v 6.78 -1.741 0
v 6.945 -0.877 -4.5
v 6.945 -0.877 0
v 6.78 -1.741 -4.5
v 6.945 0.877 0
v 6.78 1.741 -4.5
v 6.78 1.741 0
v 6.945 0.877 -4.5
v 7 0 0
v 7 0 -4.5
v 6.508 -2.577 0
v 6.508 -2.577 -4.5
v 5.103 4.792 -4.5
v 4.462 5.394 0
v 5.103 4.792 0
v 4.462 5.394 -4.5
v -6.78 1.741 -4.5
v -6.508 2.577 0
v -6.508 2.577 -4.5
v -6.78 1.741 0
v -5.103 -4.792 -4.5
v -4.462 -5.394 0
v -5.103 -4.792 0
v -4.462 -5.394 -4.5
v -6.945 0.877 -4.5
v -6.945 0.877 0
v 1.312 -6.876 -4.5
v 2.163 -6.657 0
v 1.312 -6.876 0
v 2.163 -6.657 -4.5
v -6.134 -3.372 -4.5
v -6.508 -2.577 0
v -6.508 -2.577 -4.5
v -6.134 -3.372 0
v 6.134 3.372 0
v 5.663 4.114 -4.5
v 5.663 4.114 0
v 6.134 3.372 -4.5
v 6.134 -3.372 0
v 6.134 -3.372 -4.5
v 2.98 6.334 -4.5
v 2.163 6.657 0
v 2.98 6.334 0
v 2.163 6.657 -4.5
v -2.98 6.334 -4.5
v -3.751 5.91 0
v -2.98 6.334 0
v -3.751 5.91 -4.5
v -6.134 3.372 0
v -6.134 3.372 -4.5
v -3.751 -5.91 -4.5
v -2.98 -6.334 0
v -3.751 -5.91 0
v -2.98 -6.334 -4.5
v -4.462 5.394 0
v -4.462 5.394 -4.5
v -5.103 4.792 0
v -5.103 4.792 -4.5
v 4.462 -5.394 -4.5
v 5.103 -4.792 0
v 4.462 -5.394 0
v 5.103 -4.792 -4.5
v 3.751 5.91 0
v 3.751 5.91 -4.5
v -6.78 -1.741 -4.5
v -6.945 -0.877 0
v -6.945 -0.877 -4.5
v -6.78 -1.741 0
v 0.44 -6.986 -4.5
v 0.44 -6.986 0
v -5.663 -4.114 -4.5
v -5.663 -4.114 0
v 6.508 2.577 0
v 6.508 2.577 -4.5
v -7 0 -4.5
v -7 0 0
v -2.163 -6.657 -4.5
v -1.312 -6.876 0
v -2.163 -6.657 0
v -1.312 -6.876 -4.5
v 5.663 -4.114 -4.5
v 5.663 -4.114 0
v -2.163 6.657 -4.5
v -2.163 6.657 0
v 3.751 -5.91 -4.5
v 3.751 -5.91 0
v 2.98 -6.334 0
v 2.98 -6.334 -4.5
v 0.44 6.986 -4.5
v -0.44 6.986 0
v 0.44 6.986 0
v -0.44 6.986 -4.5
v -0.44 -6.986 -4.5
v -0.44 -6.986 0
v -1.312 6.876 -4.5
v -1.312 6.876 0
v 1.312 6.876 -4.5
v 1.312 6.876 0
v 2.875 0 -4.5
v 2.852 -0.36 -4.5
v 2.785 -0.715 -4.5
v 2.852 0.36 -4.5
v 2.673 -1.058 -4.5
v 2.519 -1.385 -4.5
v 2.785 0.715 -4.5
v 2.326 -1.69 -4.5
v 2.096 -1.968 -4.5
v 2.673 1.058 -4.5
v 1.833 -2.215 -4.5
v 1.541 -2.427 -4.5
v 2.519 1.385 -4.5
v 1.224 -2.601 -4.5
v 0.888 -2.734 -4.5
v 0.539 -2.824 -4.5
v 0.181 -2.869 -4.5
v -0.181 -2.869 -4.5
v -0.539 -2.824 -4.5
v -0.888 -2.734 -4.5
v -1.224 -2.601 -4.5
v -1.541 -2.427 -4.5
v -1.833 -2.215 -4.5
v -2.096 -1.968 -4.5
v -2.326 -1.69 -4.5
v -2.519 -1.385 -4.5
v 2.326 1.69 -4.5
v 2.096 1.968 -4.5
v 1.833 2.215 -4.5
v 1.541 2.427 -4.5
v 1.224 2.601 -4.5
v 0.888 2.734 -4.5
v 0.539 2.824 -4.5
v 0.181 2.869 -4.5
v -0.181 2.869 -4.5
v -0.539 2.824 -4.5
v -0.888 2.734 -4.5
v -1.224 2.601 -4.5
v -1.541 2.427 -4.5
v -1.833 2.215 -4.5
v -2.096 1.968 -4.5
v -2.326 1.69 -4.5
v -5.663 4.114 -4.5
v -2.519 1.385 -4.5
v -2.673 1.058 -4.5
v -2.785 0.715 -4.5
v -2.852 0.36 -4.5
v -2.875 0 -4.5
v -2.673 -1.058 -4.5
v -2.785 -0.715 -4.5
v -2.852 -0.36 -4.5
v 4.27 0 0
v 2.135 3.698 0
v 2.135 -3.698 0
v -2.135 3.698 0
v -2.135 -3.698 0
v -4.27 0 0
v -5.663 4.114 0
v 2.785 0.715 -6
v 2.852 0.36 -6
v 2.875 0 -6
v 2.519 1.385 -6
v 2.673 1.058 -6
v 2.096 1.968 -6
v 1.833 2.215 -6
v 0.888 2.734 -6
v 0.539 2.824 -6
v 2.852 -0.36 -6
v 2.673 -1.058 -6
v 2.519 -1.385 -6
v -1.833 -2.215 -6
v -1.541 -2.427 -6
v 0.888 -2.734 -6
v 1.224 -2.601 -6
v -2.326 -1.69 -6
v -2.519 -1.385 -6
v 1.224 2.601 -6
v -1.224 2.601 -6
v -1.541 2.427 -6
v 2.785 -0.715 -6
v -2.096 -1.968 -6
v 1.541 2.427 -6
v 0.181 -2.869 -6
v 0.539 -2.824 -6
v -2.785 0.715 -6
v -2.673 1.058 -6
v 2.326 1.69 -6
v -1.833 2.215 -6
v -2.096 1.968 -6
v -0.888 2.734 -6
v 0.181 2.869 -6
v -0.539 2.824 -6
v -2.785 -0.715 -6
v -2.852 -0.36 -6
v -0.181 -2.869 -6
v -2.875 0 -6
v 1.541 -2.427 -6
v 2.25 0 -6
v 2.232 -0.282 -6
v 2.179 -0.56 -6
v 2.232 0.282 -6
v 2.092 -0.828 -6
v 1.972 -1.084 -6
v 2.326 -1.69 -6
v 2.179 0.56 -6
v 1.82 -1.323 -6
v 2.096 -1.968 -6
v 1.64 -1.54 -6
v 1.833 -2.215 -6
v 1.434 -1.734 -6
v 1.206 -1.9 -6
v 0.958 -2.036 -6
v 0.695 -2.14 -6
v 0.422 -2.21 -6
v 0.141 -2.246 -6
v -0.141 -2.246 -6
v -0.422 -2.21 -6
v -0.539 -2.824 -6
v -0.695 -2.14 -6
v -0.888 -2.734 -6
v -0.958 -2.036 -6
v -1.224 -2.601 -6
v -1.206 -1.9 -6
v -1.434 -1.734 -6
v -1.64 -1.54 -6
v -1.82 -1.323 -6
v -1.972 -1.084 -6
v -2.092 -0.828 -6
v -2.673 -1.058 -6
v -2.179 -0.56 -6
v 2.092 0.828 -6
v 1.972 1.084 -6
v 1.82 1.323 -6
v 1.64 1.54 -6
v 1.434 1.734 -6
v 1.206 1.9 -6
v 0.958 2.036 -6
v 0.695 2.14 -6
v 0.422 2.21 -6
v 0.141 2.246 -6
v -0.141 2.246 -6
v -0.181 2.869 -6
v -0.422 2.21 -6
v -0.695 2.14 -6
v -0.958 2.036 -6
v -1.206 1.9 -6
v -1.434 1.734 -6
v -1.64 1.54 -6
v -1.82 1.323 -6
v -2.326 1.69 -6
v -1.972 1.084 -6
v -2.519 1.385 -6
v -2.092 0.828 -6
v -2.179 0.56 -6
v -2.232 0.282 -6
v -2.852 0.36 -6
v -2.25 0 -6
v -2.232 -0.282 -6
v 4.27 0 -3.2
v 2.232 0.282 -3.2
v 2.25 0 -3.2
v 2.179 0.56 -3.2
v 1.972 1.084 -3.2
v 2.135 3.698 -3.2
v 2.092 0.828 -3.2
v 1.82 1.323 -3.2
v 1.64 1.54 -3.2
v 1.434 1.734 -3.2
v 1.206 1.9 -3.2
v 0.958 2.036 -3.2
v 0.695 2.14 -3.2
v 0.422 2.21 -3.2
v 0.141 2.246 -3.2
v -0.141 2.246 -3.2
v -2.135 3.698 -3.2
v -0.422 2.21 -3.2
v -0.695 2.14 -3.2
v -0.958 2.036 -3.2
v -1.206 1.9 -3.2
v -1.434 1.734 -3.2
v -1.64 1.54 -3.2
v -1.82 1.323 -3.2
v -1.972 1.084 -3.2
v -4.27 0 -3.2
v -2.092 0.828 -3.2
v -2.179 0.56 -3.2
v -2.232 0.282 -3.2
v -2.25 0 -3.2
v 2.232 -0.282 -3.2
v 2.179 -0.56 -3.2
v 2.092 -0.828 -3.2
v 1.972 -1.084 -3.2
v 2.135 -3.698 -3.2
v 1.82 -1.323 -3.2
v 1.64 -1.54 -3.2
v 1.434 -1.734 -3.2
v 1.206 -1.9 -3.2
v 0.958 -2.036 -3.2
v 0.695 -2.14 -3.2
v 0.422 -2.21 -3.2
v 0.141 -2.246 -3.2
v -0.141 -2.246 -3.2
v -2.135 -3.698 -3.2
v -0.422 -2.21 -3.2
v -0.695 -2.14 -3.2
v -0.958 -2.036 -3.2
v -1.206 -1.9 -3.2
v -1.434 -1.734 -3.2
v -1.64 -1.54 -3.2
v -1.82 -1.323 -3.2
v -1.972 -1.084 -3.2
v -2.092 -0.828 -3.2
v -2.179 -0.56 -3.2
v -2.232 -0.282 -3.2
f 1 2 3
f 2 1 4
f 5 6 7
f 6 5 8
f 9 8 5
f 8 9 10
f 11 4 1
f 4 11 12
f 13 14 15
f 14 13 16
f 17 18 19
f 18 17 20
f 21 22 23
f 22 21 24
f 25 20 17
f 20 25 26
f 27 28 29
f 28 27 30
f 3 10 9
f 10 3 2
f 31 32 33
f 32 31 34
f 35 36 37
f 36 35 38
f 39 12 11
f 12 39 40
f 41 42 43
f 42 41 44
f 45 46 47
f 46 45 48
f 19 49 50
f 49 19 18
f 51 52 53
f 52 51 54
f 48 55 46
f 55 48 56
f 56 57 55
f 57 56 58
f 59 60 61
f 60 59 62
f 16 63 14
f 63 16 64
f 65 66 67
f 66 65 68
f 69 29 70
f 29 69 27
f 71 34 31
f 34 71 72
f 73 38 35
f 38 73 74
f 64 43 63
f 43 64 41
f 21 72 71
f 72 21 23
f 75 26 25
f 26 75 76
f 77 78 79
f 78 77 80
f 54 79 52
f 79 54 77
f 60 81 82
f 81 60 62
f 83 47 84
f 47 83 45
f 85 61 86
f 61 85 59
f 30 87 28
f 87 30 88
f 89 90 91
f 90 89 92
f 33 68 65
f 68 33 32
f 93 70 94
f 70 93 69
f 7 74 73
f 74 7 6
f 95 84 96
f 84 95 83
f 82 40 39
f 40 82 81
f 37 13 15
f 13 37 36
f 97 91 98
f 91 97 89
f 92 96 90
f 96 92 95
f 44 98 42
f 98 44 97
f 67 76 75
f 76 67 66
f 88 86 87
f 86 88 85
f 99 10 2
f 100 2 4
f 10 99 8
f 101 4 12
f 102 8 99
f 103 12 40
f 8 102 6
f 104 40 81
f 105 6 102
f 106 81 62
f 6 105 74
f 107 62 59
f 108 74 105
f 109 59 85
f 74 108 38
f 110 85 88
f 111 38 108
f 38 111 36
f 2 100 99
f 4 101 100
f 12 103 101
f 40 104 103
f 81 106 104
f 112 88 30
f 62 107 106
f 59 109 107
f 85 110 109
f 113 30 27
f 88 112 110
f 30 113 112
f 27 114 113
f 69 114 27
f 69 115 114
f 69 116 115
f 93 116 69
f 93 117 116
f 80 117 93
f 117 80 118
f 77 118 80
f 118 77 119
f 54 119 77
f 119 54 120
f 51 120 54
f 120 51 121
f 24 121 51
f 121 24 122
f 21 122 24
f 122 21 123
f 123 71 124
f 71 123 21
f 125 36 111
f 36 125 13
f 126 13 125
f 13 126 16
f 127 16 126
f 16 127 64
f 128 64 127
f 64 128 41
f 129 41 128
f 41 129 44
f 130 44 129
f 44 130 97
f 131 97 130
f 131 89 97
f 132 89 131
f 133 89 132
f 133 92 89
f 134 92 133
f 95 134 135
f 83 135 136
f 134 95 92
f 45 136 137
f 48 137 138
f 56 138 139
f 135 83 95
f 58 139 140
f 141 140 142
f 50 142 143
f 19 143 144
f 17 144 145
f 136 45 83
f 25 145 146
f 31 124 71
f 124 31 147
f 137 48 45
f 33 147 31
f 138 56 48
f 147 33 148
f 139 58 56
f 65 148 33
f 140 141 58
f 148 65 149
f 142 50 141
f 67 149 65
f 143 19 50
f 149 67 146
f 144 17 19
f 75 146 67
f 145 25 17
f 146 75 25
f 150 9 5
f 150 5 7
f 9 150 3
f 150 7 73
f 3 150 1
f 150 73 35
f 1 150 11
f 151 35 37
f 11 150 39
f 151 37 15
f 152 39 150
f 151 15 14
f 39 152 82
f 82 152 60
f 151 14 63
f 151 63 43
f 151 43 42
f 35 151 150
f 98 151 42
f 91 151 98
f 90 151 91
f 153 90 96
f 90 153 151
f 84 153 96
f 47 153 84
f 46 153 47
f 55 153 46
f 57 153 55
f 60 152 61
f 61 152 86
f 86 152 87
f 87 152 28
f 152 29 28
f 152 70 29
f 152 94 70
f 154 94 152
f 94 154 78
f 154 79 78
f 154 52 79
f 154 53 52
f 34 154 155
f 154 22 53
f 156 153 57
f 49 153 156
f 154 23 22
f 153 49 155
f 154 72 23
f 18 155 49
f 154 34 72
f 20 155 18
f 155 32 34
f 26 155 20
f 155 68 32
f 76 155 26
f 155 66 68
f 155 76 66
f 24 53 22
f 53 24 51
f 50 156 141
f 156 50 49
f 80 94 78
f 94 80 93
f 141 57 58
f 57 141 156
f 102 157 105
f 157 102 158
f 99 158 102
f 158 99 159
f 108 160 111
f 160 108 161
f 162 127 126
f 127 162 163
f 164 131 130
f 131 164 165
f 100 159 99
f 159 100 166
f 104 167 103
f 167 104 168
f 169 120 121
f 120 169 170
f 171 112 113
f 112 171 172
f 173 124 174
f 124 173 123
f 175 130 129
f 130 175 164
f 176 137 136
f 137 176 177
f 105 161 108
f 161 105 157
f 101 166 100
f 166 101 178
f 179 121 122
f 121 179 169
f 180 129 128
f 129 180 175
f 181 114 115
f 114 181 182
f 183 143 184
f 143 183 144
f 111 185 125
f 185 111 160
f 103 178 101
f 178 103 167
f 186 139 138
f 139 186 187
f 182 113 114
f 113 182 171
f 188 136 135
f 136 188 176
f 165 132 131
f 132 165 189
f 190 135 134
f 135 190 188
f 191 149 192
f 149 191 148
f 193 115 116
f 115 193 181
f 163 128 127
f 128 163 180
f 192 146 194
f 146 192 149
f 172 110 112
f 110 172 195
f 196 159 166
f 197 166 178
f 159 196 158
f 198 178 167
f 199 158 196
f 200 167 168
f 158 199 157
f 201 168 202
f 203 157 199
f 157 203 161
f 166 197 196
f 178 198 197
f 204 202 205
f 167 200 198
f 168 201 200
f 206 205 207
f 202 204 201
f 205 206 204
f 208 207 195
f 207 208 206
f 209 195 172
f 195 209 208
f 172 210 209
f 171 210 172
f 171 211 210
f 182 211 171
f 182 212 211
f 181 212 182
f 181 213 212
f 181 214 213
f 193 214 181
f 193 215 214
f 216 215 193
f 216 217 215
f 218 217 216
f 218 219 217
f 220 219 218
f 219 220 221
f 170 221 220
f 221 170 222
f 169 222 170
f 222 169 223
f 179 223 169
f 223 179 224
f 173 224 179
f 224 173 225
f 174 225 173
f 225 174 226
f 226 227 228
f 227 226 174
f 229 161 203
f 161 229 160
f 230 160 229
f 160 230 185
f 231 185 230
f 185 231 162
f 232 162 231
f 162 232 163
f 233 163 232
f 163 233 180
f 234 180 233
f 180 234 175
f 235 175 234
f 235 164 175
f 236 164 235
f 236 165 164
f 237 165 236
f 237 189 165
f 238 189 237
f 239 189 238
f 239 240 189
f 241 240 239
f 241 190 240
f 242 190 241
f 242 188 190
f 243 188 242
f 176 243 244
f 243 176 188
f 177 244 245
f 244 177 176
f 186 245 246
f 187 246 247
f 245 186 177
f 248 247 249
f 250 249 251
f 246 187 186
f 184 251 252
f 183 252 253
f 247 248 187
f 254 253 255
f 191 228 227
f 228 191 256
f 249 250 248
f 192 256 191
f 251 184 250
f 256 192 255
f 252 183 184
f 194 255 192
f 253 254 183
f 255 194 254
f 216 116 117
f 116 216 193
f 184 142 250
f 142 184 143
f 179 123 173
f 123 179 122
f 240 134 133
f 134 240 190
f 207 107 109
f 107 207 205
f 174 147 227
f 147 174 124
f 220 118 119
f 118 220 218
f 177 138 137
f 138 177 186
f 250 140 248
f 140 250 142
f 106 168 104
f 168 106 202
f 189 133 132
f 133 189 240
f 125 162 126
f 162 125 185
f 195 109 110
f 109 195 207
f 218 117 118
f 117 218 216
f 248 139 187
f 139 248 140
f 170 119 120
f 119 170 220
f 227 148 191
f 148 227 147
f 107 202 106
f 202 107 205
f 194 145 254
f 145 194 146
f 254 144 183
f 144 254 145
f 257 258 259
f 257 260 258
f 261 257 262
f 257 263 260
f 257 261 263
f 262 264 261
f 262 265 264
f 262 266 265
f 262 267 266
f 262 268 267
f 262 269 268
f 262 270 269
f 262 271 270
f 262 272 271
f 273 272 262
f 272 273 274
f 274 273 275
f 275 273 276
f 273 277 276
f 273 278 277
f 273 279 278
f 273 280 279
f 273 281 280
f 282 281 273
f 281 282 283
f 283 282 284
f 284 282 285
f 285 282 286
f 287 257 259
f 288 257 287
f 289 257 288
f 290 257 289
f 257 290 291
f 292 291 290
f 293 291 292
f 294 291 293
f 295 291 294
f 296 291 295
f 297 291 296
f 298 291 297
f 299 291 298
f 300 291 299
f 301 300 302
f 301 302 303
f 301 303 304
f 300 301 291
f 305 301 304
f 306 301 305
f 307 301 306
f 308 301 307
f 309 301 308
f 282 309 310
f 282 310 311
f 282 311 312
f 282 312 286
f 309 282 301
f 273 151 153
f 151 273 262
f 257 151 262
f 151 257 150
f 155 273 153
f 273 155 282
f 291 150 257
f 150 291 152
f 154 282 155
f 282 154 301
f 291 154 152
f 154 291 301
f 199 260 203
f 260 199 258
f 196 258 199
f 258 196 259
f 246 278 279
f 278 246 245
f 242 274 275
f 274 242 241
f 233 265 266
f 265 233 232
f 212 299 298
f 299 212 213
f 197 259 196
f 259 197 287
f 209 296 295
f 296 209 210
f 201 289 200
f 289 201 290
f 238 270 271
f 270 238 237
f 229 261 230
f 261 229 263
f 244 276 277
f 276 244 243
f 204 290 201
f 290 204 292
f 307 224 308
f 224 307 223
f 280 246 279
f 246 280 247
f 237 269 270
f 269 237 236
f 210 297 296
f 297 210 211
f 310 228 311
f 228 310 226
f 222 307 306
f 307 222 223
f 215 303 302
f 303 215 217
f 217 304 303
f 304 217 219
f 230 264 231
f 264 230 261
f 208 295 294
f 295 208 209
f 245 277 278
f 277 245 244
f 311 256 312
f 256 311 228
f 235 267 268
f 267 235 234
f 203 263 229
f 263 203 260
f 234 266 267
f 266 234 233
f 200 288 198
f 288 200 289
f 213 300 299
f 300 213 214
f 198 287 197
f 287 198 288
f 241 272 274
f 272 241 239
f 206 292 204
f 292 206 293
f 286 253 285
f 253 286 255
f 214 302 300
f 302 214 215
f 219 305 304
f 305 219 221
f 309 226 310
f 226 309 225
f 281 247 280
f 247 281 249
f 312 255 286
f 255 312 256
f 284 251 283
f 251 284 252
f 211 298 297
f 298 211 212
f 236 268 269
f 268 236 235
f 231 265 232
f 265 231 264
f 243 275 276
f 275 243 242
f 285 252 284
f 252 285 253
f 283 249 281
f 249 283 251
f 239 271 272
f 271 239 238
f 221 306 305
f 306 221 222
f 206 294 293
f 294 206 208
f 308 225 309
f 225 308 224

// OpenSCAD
$fn = 50;

difference() {
	union() {
		translate(v = [0, 0, -4.5]) {
			cylinder(h = 4.5, r = 7.0);
		}
		#translate(v = [0, 0, -6.0]) {
			cylinder(h = 6, r = 2.875);
		}
	}
	union() {
		translate(v = [0, 0, 0]) {
			rotate(a = [0, 0, 0]) {
				difference() {
					union() {
						translate(v = [0, 0, -3.2]) {
							linear_extrude(height = 3.2) {
								polygon(points = [[4.2698, 0.0], [2.1349000000000005, 3.697755269078796], [-2.134899999999999, 3.6977552690787965], [-4.2698, 5.228996902999369e-16], [-2.134900000000002, -3.6977552690787956], [2.1348999999999974, -3.697755269078798]]);
							}
						}
					}
					union();
				}
			}
		}
		#translate(v = [0, 0, -100.0]) {
			cylinder(h = 200, r = 2.25);
		}
	}
}
